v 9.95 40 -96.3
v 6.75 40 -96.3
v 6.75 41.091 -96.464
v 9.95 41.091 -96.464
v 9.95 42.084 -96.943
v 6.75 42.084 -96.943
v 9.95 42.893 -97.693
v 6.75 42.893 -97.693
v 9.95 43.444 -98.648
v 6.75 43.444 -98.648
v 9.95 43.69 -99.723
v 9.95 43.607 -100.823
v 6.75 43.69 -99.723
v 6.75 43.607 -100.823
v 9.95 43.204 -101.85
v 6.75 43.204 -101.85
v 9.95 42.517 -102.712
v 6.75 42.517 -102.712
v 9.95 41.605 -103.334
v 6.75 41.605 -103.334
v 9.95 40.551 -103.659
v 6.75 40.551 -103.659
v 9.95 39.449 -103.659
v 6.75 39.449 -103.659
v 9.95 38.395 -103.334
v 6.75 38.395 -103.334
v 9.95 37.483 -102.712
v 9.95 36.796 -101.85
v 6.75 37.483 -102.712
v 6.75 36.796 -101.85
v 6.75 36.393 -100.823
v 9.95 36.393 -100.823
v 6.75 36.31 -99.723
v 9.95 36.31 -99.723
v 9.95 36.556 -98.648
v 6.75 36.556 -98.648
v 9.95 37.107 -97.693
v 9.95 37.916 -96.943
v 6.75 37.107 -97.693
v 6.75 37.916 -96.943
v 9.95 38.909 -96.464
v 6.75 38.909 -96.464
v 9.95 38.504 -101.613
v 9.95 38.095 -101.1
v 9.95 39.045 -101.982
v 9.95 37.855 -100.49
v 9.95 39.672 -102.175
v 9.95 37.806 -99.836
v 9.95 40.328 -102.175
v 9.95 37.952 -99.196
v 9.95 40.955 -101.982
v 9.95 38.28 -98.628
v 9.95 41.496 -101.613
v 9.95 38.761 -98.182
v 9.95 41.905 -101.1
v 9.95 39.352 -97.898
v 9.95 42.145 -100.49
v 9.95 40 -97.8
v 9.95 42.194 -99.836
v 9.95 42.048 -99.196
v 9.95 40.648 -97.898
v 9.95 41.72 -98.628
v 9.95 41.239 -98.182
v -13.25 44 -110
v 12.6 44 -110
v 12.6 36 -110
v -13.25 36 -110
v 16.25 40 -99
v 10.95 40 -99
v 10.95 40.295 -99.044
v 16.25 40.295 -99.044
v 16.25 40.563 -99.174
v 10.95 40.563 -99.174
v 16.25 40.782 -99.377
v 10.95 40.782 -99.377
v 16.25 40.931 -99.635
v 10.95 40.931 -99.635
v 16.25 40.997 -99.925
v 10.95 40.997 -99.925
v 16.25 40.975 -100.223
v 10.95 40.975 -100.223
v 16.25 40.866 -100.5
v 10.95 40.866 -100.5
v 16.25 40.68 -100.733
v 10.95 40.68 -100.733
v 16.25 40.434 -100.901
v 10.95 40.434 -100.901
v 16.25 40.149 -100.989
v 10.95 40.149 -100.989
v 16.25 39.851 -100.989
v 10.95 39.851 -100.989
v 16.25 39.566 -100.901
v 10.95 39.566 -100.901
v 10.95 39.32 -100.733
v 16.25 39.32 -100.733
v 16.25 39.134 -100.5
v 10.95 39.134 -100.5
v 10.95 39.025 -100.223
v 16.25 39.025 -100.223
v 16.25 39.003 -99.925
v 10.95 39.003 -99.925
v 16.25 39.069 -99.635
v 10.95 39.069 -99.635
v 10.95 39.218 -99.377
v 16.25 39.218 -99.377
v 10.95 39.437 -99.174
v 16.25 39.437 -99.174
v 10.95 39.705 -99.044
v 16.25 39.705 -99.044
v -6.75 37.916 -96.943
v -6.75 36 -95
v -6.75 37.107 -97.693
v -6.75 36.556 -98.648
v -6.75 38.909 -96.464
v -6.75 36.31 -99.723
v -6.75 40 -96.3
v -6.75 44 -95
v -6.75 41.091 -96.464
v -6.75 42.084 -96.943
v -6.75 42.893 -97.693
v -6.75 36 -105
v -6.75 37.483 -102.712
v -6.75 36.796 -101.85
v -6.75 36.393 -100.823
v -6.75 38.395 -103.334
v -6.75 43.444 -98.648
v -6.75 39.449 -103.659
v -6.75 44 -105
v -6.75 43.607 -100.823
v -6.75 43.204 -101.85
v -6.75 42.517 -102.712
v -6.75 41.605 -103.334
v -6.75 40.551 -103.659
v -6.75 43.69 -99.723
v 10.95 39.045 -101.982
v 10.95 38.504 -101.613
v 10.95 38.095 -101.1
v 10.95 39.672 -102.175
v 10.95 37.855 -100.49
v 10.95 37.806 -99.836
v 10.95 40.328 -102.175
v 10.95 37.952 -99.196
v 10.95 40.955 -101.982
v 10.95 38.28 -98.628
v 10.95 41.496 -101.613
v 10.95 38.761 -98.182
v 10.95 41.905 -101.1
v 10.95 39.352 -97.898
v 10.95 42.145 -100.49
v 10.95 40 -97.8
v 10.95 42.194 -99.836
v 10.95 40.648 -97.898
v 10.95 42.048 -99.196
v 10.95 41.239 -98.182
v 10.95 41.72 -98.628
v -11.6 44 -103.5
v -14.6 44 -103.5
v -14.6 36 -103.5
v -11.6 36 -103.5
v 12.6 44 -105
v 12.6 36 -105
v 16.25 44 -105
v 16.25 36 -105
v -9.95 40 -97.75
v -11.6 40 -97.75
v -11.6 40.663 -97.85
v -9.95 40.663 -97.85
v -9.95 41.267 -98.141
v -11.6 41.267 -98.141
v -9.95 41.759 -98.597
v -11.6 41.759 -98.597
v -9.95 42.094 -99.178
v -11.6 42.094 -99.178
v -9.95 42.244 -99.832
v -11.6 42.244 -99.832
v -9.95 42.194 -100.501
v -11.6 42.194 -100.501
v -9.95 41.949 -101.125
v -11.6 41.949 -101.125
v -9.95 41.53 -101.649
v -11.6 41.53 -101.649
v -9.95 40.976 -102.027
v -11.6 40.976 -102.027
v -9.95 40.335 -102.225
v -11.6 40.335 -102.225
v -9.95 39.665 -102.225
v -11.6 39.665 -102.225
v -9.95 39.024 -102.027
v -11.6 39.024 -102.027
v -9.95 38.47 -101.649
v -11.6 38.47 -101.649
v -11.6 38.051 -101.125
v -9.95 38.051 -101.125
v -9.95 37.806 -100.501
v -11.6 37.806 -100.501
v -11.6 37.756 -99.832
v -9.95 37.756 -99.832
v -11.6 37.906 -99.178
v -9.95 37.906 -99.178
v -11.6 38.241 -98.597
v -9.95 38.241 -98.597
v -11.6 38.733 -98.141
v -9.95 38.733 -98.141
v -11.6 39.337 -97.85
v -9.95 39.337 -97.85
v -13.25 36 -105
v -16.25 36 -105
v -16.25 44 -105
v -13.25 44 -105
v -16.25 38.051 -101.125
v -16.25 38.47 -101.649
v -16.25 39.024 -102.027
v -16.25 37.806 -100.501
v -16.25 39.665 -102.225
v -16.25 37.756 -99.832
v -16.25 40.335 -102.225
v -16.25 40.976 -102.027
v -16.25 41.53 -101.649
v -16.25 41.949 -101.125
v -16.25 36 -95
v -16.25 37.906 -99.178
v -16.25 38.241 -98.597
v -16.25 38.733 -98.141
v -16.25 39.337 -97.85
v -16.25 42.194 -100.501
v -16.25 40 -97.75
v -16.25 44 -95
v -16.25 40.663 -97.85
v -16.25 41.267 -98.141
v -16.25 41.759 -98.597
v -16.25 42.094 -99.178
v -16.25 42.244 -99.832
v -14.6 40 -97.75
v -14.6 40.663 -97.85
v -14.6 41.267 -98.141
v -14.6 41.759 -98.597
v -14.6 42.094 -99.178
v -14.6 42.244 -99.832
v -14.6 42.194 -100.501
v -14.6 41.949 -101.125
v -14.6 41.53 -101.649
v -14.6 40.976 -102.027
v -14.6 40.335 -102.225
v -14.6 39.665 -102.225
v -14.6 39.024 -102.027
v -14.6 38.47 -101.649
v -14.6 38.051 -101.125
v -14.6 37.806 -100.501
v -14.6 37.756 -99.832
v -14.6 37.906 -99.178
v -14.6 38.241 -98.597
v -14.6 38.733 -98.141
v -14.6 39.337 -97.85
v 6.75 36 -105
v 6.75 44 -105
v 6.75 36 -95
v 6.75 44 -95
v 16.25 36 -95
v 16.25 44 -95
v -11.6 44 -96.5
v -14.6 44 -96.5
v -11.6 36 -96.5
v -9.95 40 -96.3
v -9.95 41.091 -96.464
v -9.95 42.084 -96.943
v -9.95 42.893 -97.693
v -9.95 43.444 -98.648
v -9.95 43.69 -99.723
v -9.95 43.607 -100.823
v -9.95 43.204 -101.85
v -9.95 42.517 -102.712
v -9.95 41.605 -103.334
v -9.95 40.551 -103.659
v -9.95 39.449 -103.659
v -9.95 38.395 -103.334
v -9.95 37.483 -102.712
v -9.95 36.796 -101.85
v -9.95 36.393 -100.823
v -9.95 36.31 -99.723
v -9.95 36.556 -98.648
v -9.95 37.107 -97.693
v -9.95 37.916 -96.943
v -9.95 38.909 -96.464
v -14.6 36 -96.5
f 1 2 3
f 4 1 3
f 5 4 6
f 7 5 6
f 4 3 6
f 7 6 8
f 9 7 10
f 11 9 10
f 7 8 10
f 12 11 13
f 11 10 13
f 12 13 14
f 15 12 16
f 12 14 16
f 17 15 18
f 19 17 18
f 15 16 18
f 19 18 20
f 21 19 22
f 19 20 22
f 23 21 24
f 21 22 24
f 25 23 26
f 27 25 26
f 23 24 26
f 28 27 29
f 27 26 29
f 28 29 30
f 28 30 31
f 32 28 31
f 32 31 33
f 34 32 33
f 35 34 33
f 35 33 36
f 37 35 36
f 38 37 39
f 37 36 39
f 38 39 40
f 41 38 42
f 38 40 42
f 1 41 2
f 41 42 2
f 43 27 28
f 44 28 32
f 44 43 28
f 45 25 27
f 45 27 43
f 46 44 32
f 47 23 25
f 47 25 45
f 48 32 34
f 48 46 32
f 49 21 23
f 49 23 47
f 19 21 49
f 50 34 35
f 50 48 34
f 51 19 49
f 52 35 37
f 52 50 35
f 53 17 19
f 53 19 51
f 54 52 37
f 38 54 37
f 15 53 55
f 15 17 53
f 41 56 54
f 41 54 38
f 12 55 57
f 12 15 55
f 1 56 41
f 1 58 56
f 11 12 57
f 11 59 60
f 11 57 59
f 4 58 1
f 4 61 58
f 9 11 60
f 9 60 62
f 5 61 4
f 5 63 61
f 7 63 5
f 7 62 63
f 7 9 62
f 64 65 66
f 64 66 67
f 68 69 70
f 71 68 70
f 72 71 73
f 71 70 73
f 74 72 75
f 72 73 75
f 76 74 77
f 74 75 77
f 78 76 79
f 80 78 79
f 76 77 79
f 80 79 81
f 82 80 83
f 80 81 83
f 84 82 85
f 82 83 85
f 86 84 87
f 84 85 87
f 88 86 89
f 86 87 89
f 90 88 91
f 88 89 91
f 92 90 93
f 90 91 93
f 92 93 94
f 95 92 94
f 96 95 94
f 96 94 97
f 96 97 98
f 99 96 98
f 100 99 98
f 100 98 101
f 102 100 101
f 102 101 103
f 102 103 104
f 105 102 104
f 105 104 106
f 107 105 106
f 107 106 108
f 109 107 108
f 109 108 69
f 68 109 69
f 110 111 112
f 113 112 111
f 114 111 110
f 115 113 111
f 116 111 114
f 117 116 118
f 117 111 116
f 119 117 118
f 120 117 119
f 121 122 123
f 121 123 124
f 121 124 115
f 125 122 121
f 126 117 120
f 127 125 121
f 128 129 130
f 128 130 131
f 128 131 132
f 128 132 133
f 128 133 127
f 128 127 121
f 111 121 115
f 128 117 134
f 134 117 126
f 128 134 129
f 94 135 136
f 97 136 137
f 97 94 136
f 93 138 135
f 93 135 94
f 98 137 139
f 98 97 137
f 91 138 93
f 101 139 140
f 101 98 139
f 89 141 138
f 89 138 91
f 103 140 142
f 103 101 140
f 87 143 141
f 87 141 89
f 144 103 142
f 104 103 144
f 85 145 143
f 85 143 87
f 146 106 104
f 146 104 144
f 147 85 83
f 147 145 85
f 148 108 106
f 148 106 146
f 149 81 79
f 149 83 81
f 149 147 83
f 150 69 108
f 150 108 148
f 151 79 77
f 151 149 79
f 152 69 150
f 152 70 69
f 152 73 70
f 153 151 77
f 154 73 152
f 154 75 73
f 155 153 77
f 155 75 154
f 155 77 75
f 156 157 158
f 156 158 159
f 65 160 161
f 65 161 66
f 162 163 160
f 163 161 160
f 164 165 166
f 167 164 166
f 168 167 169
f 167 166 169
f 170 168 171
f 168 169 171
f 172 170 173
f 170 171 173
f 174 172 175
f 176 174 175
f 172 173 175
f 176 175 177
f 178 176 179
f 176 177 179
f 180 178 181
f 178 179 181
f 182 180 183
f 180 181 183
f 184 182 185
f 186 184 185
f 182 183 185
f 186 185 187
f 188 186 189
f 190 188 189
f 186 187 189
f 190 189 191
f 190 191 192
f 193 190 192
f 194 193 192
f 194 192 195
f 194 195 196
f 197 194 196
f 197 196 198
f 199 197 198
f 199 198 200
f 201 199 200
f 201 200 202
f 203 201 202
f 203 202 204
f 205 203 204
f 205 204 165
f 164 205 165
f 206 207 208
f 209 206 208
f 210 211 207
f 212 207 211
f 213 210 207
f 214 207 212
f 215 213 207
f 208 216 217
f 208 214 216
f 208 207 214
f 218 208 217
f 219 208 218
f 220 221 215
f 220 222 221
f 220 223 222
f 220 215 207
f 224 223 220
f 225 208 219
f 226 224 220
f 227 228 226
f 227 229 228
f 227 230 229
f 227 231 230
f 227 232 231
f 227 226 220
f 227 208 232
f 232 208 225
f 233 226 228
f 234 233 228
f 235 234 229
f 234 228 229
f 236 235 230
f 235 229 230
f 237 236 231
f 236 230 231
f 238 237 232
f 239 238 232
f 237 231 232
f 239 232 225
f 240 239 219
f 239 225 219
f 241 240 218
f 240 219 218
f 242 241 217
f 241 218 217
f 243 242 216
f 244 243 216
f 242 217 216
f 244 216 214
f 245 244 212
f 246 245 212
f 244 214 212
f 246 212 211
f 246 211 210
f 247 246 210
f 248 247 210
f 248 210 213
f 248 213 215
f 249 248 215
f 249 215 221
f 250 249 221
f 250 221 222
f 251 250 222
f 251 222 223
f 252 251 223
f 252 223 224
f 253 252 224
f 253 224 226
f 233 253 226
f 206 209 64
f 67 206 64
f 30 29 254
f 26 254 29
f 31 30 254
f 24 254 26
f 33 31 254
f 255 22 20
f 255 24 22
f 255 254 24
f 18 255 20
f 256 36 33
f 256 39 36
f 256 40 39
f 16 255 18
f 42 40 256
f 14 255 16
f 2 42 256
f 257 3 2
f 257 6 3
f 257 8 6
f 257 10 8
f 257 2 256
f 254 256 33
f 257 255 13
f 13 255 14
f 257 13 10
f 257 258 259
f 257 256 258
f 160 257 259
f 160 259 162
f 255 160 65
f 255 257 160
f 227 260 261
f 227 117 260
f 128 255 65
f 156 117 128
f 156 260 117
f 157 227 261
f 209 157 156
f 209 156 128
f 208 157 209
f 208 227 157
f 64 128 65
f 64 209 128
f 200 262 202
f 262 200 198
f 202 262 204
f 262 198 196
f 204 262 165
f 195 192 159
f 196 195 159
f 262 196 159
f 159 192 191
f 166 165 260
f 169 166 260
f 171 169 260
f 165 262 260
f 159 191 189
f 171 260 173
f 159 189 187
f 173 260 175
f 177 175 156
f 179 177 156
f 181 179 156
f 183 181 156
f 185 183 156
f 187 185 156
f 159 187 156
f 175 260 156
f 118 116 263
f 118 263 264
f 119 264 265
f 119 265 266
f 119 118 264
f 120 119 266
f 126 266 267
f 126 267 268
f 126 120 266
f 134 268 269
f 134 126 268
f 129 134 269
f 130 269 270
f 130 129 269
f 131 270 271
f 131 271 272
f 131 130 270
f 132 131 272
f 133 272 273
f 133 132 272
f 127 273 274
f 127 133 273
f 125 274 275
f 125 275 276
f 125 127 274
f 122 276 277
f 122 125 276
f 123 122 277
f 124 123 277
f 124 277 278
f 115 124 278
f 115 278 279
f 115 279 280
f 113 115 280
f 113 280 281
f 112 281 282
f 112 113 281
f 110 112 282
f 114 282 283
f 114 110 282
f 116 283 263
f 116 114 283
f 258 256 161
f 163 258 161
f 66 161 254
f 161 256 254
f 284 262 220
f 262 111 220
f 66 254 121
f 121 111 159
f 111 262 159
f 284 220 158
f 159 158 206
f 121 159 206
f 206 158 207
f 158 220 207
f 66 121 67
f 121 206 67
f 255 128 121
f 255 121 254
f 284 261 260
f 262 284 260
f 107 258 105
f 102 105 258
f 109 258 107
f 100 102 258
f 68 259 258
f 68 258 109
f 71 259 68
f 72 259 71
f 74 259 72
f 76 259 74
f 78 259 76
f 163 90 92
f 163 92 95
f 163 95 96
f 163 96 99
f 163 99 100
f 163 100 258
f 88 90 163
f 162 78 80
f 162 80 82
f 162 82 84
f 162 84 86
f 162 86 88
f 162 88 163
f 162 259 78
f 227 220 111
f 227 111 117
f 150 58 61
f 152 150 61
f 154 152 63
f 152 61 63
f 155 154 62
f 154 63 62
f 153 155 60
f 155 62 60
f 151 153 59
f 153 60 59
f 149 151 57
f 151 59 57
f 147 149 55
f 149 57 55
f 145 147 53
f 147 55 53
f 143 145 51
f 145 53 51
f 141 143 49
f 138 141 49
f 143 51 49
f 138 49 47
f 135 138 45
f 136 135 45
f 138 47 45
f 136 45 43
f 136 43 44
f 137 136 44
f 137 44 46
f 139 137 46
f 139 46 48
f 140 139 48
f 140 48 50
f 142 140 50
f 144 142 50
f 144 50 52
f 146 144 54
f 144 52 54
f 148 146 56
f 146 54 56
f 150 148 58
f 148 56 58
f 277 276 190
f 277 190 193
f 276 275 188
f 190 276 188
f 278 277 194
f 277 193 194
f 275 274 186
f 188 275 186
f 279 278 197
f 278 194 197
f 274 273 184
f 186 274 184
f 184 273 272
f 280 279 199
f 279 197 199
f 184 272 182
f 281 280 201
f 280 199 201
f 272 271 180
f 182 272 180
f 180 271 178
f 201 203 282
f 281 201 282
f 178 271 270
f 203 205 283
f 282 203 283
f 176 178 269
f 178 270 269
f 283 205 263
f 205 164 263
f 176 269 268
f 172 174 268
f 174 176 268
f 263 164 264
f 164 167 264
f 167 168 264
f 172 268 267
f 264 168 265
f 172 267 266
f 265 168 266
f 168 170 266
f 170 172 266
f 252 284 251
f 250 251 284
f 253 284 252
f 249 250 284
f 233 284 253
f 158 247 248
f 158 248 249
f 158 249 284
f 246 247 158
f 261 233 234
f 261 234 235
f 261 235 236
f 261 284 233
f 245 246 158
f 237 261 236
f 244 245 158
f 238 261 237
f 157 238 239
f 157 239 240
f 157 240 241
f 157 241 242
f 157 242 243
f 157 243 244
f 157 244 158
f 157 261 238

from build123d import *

# Parameters (mm, degrees)
SHAPE_DEPTH                   = 4
SHAPE_DEPTH_BACK              = 4
ESQUISSE19_R                  = 2.25
HOLEAXE_MOTOR_DEPTH           = 13
ESQUISSE20_R                  = 3.7
HOLEBEARING_MOTOR_DEPTH       = 3.2
ESQUISSE21_R                  = 2.2
ENTRETOISEBEARING_MOTOR_DEPTH = 1
EXT_MOTOR_START               = 3
ESQUISSE22_W                  = 10
ESQUISSE22_H                  = 8
ESQUISSE22_R                  = 2.25
EXT_MOTOR_DEPTH               = 3
ESQUISSE23_W                  = 3
ESQUISSE23_H                  = 7
HOLESCREWLESS_MOTOR_DEPTH     = 10
ESQUISSE24_W                  = 10
ESQUISSE24_H                  = 8
BOSS_EXTRU_1_DEPTH            = 3
ESQUISSE25_W                  = 5
ESQUISSE25_H                  = 8
ADJUSTMENT_ATTACH_DEPTH       = 0.65
ESQUISSE26_R                  = 1
REMOVE_HELPER_DEPTH           = 10


with BuildPart() as part:
    # Esquisse17 → Shape (new, two sides: drawn at the far end of the back side and taken through both)
    with BuildSketch(Plane(origin=(0, 40, 0), x_dir=(-1, 0, 0), z_dir=(0, -1, 0)).offset(-SHAPE_DEPTH_BACK)):
        Polygon((13.25, 105), (13.25, 95), (6.75, 95), (6.75, 105), (-6.75, 105), (-6.75, 95), (-13.25, 95), (-13.25, 105), (-13.25, 110), (13.25, 110), align=None)
    extrude(amount=SHAPE_DEPTH + SHAPE_DEPTH_BACK)

    # Esquisse19 → HoleAxe_motor (cut)
    with BuildSketch(Plane.ZY.offset(13.25)):
        with Locations((-100, 40)):
            Circle(ESQUISSE19_R)
    extrude(amount=-HOLEAXE_MOTOR_DEPTH, mode=Mode.SUBTRACT)

    # Esquisse20 → HoleBearing_motor (cut)
    with BuildSketch(Plane.ZY.offset(-6.75)):
        with Locations((-100, 40)):
            Circle(ESQUISSE20_R)
    holebearing_motor = extrude(amount=-HOLEBEARING_MOTOR_DEPTH, mode=Mode.SUBTRACT)

    # Symétrie3: HoleBearing_motor across plane
    add(holebearing_motor.mirror(Plane(origin=(0, 0, 0), x_dir=(0, 0, 1), z_dir=(1, 0, 0))), mode=Mode.SUBTRACT)

    # Esquisse21 → entretoiseBearing_motor (cut)
    with BuildSketch(Plane.ZY.offset(-9.95)):
        with Locations((-100, 40)):
            Circle(ESQUISSE21_R)
    extrude(amount=-ENTRETOISEBEARING_MOTOR_DEPTH, mode=Mode.SUBTRACT)

    # Esquisse22 → Ext_motor (add)
    with BuildSketch(Plane.ZY.offset(13.25).offset(EXT_MOTOR_START)):
        with Locations((-100, 40)):
            Rectangle(ESQUISSE22_W, ESQUISSE22_H)
        with Locations((-100, 40)):
            Circle(ESQUISSE22_R, mode=Mode.SUBTRACT)
    extrude(amount=-EXT_MOTOR_DEPTH)

    # Esquisse23 → HoleScrewLess_motor (cut)
    with BuildSketch(Plane(origin=(0, 44, 0), x_dir=(1, 0, 0), z_dir=(0, 1, 0))):
        with Locations((-13.1, 100)):
            Rectangle(ESQUISSE23_W, ESQUISSE23_H)
    extrude(amount=-HOLESCREWLESS_MOTOR_DEPTH, mode=Mode.SUBTRACT)

    # Esquisse24 → Boss.-Extru.1 (add)
    with BuildSketch(Plane(origin=(13.25, 0, 0), x_dir=(0, 0, -1), z_dir=(1, 0, 0))):
        with Locations((100, 40)):
            Rectangle(ESQUISSE24_W, ESQUISSE24_H)
    extrude(amount=BOSS_EXTRU_1_DEPTH)

    # Esquisse25 → Adjustment attach (cut)
    with BuildSketch(Plane(origin=(13.25, 0, 0), x_dir=(0, 0, -1), z_dir=(1, 0, 0))):
        with Locations((107.5, 40)):
            Rectangle(ESQUISSE25_W, ESQUISSE25_H)
    extrude(amount=-ADJUSTMENT_ATTACH_DEPTH, mode=Mode.SUBTRACT)

    # Esquisse26 → Remove helper (cut)
    with BuildSketch(Plane.ZY.offset(-10.95)):
        with Locations((-100, 40)):
            Circle(ESQUISSE26_R)
    extrude(amount=-REMOVE_HELPER_DEPTH, mode=Mode.SUBTRACT)


solid = part.part
